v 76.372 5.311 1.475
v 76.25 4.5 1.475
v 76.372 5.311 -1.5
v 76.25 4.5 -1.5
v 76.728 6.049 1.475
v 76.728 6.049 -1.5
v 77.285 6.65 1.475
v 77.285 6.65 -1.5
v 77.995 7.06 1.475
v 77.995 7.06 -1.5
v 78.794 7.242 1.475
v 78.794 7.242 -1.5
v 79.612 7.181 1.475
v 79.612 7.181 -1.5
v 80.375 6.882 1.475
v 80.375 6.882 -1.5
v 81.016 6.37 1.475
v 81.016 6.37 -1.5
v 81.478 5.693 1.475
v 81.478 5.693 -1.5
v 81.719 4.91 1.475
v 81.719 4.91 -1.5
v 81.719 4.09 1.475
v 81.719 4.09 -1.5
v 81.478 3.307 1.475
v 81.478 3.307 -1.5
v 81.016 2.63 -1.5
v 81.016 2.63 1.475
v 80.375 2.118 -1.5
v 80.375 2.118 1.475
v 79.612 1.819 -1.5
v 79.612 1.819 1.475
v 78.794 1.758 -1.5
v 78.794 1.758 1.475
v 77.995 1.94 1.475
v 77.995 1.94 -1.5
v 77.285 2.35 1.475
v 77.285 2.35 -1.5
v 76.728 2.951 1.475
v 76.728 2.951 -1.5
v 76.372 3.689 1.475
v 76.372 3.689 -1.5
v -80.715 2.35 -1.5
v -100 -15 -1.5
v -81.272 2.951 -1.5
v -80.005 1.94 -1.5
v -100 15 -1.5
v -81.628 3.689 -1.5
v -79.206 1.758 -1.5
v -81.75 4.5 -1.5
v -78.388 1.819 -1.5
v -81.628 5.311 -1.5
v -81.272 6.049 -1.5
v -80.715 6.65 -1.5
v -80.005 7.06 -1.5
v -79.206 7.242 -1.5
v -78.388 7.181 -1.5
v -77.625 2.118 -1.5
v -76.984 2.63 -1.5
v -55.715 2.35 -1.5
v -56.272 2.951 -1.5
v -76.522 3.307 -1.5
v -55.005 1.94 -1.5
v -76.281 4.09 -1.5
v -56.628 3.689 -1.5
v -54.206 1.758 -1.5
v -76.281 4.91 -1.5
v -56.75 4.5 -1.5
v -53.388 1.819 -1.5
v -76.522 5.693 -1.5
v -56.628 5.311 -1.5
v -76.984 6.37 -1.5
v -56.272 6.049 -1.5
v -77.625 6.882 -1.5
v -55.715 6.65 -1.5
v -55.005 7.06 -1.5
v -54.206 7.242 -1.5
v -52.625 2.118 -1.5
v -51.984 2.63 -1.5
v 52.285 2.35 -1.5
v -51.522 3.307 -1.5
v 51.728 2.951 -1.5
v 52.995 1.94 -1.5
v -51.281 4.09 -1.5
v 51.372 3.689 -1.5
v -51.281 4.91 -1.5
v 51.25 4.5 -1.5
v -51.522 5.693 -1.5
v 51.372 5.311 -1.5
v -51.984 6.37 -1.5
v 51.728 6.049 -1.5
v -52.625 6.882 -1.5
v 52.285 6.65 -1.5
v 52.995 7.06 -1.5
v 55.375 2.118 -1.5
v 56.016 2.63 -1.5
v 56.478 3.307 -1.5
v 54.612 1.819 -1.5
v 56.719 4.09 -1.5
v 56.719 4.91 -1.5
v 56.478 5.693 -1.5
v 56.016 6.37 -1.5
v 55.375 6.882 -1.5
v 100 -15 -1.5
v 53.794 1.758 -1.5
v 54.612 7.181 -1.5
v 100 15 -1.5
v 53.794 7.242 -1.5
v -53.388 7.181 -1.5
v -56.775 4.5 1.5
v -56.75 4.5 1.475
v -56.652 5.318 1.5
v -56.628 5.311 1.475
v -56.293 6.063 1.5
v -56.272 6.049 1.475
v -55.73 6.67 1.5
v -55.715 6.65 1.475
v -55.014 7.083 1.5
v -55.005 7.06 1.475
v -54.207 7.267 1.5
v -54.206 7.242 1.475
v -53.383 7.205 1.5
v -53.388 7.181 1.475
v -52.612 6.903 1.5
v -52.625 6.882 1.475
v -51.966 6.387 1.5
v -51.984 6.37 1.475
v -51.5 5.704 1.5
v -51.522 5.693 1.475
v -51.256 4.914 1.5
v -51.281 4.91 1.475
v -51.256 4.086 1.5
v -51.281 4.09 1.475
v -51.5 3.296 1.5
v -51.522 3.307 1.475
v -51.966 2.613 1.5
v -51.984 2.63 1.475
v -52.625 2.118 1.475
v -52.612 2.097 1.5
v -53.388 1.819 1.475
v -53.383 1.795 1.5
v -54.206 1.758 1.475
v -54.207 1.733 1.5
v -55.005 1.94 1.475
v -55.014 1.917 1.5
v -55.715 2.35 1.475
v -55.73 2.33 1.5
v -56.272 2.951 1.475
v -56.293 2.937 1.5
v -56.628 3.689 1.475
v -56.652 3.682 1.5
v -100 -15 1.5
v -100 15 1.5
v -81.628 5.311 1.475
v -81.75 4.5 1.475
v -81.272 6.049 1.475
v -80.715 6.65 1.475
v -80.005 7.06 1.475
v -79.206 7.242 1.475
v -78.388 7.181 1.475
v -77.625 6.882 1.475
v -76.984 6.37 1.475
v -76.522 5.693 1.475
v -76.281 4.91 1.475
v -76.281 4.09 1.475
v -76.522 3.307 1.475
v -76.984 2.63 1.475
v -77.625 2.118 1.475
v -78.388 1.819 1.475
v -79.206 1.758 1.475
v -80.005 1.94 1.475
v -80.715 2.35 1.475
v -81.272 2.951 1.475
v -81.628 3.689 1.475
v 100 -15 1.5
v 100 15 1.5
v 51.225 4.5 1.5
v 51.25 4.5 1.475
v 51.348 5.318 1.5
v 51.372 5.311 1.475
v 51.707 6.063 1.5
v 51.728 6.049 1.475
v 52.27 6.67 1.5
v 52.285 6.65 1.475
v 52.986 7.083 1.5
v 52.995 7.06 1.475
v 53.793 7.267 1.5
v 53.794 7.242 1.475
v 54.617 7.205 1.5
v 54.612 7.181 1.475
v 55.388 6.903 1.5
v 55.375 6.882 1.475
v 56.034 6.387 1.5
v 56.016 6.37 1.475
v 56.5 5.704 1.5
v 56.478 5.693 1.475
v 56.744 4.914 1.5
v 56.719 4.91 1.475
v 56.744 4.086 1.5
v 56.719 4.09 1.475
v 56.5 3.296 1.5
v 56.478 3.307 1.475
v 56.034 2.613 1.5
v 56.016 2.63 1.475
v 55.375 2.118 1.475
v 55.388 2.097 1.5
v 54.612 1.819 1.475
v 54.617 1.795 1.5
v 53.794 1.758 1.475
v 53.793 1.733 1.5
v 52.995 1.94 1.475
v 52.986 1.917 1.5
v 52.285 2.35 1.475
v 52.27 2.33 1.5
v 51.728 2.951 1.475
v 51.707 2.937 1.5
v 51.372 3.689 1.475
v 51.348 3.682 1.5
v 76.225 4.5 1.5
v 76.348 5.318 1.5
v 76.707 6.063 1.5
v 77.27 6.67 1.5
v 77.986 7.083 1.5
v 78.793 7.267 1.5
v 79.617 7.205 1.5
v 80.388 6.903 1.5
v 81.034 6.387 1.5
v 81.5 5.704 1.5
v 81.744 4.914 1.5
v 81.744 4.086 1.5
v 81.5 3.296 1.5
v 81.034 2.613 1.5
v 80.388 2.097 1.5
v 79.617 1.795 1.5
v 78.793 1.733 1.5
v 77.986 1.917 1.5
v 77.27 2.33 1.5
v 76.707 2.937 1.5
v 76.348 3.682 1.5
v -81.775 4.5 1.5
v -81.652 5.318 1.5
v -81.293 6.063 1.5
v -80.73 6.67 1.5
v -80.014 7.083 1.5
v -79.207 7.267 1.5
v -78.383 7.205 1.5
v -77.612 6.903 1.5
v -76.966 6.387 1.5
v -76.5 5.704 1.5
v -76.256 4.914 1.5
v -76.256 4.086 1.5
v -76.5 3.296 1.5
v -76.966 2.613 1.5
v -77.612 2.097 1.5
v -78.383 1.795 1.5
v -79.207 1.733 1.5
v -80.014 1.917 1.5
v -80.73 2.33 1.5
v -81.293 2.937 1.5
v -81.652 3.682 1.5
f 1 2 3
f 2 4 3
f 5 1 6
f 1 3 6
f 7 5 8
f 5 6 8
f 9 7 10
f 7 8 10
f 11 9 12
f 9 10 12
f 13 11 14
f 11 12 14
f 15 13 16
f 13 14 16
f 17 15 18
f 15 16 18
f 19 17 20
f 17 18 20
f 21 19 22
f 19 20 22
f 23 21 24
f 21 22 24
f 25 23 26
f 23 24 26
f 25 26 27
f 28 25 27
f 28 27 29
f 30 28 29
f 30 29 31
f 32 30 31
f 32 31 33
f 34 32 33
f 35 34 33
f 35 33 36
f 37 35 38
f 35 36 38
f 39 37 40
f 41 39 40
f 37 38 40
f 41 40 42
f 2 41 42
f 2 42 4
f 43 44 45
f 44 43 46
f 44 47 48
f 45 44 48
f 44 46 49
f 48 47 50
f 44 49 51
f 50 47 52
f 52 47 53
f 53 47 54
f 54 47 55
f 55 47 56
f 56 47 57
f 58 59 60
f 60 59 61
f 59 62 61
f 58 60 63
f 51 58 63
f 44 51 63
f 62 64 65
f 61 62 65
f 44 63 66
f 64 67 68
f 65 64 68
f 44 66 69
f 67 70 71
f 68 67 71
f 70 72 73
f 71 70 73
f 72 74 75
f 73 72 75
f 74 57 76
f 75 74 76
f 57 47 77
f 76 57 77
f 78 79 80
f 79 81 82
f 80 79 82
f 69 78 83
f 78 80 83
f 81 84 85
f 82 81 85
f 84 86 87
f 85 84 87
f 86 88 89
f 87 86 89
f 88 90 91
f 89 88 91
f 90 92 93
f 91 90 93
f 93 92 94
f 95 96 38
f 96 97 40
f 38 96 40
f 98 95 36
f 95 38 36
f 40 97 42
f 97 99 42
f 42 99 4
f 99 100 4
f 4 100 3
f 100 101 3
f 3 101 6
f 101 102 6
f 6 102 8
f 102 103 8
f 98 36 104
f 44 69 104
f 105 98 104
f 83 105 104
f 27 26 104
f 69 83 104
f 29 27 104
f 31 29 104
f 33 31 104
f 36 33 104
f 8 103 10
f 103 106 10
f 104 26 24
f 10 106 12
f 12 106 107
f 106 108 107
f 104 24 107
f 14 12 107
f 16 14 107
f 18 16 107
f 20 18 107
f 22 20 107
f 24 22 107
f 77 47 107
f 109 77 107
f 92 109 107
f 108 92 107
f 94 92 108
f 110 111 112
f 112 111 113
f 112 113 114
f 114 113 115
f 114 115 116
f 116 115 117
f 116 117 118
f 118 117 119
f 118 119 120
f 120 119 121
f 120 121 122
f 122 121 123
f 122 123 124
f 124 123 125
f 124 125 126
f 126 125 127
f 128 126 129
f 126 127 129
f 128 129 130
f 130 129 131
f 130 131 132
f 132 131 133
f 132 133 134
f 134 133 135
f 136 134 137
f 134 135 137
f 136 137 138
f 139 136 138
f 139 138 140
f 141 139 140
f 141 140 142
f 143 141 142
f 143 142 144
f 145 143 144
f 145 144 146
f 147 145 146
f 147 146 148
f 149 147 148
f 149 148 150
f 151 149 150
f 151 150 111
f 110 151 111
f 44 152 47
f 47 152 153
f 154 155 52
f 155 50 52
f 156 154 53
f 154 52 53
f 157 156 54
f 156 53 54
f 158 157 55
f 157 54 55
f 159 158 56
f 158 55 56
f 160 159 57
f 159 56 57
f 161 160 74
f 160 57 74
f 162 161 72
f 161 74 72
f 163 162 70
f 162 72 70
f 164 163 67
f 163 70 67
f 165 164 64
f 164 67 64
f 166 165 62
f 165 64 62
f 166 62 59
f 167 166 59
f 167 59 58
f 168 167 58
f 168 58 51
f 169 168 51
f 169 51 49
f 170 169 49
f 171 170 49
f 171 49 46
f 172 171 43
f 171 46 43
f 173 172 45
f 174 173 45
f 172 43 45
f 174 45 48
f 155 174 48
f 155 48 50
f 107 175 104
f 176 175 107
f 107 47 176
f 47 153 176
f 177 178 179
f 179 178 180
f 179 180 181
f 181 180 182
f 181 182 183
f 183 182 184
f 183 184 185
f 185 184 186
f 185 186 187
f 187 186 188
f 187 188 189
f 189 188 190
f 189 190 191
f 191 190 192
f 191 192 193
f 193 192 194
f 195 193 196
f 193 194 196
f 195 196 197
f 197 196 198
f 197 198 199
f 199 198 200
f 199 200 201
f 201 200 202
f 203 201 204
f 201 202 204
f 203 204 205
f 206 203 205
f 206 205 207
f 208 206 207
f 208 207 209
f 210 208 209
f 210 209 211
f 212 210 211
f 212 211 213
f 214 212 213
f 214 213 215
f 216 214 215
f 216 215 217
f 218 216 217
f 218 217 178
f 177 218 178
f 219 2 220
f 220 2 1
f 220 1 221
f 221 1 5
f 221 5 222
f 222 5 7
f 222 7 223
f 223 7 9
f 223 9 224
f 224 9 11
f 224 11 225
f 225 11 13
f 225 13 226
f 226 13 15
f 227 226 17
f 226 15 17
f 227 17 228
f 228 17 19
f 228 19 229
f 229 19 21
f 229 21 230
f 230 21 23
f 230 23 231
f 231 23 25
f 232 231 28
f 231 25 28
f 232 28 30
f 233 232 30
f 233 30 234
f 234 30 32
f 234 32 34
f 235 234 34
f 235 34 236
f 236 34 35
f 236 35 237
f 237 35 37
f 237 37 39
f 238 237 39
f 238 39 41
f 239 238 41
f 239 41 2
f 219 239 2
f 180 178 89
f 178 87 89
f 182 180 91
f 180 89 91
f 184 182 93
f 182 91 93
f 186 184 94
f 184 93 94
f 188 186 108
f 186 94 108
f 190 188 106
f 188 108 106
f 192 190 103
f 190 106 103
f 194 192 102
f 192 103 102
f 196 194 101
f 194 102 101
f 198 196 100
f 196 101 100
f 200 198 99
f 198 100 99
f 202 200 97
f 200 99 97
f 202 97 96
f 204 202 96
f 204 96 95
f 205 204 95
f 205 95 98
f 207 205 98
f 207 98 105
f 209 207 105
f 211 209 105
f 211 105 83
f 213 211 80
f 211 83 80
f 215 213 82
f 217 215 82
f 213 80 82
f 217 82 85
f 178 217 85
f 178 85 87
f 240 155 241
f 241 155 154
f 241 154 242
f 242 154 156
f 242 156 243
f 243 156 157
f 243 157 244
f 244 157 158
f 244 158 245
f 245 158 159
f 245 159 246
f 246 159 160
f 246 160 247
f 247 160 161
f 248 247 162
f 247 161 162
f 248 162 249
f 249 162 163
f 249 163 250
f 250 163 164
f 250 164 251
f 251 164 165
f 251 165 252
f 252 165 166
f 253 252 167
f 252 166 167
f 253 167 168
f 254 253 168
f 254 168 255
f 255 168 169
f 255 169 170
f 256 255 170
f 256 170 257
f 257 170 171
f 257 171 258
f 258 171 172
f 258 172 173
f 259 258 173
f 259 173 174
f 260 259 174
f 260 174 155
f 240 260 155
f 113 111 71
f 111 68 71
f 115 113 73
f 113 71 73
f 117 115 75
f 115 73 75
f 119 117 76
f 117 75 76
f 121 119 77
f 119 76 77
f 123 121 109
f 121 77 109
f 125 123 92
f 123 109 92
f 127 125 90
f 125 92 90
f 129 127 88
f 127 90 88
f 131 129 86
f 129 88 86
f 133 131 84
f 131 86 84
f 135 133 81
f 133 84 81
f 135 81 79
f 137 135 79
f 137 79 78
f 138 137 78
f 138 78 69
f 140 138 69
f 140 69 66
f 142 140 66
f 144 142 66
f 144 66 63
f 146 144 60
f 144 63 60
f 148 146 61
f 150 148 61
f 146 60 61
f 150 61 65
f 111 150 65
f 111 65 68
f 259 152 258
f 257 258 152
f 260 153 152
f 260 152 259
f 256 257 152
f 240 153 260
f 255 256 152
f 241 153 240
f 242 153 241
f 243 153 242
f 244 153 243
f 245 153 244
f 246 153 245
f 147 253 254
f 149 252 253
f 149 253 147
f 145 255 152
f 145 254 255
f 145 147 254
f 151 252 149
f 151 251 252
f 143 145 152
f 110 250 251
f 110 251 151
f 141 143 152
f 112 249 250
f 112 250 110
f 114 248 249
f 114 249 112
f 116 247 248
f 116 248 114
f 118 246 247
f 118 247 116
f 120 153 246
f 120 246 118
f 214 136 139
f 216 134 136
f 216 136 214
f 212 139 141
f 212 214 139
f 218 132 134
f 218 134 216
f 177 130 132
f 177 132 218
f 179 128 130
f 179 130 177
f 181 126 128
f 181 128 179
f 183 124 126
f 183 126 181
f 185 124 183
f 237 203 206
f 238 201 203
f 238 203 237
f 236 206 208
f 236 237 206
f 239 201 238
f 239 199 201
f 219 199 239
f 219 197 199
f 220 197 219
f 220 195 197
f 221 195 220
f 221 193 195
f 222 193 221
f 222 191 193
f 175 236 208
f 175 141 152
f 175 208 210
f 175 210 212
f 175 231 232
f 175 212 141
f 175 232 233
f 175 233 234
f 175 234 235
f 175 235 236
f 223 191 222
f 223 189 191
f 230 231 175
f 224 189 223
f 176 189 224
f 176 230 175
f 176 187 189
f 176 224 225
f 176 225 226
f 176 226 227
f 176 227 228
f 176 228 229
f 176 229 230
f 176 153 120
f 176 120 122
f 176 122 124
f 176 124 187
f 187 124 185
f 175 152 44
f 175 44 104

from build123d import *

# Parameters (mm, degrees)
SKETCH1_W                      = 200
SKETCH1_H                      = 30
BOSS_EXTRUDE1_DEPTH            = 1.5
M5_CLEARANCE_HOLE1_D           = 5.5
M5_CLEARANCE_HOLE1_CSINK_D     = 5.55
M5_CLEARANCE_HOLE1_CSINK_ANGLE = 90


with BuildPart() as part:
    # Sketch1 → Boss-Extrude1 (new, symmetric)
    with BuildSketch(Plane.XY):
        Rectangle(SKETCH1_W, SKETCH1_H)
    extrude(amount=BOSS_EXTRUDE1_DEPTH, both=True)

    # M5 Clearance Hole1 (through all)
    with Locations(Plane.XY.offset(1.5)):
        with Locations((54, 4.5), (-79, 4.5), (-54, 4.5), (79, 4.5)):
            CounterSinkHole(M5_CLEARANCE_HOLE1_D / 2, M5_CLEARANCE_HOLE1_CSINK_D / 2, counter_sink_angle=M5_CLEARANCE_HOLE1_CSINK_ANGLE)


solid = part.part
